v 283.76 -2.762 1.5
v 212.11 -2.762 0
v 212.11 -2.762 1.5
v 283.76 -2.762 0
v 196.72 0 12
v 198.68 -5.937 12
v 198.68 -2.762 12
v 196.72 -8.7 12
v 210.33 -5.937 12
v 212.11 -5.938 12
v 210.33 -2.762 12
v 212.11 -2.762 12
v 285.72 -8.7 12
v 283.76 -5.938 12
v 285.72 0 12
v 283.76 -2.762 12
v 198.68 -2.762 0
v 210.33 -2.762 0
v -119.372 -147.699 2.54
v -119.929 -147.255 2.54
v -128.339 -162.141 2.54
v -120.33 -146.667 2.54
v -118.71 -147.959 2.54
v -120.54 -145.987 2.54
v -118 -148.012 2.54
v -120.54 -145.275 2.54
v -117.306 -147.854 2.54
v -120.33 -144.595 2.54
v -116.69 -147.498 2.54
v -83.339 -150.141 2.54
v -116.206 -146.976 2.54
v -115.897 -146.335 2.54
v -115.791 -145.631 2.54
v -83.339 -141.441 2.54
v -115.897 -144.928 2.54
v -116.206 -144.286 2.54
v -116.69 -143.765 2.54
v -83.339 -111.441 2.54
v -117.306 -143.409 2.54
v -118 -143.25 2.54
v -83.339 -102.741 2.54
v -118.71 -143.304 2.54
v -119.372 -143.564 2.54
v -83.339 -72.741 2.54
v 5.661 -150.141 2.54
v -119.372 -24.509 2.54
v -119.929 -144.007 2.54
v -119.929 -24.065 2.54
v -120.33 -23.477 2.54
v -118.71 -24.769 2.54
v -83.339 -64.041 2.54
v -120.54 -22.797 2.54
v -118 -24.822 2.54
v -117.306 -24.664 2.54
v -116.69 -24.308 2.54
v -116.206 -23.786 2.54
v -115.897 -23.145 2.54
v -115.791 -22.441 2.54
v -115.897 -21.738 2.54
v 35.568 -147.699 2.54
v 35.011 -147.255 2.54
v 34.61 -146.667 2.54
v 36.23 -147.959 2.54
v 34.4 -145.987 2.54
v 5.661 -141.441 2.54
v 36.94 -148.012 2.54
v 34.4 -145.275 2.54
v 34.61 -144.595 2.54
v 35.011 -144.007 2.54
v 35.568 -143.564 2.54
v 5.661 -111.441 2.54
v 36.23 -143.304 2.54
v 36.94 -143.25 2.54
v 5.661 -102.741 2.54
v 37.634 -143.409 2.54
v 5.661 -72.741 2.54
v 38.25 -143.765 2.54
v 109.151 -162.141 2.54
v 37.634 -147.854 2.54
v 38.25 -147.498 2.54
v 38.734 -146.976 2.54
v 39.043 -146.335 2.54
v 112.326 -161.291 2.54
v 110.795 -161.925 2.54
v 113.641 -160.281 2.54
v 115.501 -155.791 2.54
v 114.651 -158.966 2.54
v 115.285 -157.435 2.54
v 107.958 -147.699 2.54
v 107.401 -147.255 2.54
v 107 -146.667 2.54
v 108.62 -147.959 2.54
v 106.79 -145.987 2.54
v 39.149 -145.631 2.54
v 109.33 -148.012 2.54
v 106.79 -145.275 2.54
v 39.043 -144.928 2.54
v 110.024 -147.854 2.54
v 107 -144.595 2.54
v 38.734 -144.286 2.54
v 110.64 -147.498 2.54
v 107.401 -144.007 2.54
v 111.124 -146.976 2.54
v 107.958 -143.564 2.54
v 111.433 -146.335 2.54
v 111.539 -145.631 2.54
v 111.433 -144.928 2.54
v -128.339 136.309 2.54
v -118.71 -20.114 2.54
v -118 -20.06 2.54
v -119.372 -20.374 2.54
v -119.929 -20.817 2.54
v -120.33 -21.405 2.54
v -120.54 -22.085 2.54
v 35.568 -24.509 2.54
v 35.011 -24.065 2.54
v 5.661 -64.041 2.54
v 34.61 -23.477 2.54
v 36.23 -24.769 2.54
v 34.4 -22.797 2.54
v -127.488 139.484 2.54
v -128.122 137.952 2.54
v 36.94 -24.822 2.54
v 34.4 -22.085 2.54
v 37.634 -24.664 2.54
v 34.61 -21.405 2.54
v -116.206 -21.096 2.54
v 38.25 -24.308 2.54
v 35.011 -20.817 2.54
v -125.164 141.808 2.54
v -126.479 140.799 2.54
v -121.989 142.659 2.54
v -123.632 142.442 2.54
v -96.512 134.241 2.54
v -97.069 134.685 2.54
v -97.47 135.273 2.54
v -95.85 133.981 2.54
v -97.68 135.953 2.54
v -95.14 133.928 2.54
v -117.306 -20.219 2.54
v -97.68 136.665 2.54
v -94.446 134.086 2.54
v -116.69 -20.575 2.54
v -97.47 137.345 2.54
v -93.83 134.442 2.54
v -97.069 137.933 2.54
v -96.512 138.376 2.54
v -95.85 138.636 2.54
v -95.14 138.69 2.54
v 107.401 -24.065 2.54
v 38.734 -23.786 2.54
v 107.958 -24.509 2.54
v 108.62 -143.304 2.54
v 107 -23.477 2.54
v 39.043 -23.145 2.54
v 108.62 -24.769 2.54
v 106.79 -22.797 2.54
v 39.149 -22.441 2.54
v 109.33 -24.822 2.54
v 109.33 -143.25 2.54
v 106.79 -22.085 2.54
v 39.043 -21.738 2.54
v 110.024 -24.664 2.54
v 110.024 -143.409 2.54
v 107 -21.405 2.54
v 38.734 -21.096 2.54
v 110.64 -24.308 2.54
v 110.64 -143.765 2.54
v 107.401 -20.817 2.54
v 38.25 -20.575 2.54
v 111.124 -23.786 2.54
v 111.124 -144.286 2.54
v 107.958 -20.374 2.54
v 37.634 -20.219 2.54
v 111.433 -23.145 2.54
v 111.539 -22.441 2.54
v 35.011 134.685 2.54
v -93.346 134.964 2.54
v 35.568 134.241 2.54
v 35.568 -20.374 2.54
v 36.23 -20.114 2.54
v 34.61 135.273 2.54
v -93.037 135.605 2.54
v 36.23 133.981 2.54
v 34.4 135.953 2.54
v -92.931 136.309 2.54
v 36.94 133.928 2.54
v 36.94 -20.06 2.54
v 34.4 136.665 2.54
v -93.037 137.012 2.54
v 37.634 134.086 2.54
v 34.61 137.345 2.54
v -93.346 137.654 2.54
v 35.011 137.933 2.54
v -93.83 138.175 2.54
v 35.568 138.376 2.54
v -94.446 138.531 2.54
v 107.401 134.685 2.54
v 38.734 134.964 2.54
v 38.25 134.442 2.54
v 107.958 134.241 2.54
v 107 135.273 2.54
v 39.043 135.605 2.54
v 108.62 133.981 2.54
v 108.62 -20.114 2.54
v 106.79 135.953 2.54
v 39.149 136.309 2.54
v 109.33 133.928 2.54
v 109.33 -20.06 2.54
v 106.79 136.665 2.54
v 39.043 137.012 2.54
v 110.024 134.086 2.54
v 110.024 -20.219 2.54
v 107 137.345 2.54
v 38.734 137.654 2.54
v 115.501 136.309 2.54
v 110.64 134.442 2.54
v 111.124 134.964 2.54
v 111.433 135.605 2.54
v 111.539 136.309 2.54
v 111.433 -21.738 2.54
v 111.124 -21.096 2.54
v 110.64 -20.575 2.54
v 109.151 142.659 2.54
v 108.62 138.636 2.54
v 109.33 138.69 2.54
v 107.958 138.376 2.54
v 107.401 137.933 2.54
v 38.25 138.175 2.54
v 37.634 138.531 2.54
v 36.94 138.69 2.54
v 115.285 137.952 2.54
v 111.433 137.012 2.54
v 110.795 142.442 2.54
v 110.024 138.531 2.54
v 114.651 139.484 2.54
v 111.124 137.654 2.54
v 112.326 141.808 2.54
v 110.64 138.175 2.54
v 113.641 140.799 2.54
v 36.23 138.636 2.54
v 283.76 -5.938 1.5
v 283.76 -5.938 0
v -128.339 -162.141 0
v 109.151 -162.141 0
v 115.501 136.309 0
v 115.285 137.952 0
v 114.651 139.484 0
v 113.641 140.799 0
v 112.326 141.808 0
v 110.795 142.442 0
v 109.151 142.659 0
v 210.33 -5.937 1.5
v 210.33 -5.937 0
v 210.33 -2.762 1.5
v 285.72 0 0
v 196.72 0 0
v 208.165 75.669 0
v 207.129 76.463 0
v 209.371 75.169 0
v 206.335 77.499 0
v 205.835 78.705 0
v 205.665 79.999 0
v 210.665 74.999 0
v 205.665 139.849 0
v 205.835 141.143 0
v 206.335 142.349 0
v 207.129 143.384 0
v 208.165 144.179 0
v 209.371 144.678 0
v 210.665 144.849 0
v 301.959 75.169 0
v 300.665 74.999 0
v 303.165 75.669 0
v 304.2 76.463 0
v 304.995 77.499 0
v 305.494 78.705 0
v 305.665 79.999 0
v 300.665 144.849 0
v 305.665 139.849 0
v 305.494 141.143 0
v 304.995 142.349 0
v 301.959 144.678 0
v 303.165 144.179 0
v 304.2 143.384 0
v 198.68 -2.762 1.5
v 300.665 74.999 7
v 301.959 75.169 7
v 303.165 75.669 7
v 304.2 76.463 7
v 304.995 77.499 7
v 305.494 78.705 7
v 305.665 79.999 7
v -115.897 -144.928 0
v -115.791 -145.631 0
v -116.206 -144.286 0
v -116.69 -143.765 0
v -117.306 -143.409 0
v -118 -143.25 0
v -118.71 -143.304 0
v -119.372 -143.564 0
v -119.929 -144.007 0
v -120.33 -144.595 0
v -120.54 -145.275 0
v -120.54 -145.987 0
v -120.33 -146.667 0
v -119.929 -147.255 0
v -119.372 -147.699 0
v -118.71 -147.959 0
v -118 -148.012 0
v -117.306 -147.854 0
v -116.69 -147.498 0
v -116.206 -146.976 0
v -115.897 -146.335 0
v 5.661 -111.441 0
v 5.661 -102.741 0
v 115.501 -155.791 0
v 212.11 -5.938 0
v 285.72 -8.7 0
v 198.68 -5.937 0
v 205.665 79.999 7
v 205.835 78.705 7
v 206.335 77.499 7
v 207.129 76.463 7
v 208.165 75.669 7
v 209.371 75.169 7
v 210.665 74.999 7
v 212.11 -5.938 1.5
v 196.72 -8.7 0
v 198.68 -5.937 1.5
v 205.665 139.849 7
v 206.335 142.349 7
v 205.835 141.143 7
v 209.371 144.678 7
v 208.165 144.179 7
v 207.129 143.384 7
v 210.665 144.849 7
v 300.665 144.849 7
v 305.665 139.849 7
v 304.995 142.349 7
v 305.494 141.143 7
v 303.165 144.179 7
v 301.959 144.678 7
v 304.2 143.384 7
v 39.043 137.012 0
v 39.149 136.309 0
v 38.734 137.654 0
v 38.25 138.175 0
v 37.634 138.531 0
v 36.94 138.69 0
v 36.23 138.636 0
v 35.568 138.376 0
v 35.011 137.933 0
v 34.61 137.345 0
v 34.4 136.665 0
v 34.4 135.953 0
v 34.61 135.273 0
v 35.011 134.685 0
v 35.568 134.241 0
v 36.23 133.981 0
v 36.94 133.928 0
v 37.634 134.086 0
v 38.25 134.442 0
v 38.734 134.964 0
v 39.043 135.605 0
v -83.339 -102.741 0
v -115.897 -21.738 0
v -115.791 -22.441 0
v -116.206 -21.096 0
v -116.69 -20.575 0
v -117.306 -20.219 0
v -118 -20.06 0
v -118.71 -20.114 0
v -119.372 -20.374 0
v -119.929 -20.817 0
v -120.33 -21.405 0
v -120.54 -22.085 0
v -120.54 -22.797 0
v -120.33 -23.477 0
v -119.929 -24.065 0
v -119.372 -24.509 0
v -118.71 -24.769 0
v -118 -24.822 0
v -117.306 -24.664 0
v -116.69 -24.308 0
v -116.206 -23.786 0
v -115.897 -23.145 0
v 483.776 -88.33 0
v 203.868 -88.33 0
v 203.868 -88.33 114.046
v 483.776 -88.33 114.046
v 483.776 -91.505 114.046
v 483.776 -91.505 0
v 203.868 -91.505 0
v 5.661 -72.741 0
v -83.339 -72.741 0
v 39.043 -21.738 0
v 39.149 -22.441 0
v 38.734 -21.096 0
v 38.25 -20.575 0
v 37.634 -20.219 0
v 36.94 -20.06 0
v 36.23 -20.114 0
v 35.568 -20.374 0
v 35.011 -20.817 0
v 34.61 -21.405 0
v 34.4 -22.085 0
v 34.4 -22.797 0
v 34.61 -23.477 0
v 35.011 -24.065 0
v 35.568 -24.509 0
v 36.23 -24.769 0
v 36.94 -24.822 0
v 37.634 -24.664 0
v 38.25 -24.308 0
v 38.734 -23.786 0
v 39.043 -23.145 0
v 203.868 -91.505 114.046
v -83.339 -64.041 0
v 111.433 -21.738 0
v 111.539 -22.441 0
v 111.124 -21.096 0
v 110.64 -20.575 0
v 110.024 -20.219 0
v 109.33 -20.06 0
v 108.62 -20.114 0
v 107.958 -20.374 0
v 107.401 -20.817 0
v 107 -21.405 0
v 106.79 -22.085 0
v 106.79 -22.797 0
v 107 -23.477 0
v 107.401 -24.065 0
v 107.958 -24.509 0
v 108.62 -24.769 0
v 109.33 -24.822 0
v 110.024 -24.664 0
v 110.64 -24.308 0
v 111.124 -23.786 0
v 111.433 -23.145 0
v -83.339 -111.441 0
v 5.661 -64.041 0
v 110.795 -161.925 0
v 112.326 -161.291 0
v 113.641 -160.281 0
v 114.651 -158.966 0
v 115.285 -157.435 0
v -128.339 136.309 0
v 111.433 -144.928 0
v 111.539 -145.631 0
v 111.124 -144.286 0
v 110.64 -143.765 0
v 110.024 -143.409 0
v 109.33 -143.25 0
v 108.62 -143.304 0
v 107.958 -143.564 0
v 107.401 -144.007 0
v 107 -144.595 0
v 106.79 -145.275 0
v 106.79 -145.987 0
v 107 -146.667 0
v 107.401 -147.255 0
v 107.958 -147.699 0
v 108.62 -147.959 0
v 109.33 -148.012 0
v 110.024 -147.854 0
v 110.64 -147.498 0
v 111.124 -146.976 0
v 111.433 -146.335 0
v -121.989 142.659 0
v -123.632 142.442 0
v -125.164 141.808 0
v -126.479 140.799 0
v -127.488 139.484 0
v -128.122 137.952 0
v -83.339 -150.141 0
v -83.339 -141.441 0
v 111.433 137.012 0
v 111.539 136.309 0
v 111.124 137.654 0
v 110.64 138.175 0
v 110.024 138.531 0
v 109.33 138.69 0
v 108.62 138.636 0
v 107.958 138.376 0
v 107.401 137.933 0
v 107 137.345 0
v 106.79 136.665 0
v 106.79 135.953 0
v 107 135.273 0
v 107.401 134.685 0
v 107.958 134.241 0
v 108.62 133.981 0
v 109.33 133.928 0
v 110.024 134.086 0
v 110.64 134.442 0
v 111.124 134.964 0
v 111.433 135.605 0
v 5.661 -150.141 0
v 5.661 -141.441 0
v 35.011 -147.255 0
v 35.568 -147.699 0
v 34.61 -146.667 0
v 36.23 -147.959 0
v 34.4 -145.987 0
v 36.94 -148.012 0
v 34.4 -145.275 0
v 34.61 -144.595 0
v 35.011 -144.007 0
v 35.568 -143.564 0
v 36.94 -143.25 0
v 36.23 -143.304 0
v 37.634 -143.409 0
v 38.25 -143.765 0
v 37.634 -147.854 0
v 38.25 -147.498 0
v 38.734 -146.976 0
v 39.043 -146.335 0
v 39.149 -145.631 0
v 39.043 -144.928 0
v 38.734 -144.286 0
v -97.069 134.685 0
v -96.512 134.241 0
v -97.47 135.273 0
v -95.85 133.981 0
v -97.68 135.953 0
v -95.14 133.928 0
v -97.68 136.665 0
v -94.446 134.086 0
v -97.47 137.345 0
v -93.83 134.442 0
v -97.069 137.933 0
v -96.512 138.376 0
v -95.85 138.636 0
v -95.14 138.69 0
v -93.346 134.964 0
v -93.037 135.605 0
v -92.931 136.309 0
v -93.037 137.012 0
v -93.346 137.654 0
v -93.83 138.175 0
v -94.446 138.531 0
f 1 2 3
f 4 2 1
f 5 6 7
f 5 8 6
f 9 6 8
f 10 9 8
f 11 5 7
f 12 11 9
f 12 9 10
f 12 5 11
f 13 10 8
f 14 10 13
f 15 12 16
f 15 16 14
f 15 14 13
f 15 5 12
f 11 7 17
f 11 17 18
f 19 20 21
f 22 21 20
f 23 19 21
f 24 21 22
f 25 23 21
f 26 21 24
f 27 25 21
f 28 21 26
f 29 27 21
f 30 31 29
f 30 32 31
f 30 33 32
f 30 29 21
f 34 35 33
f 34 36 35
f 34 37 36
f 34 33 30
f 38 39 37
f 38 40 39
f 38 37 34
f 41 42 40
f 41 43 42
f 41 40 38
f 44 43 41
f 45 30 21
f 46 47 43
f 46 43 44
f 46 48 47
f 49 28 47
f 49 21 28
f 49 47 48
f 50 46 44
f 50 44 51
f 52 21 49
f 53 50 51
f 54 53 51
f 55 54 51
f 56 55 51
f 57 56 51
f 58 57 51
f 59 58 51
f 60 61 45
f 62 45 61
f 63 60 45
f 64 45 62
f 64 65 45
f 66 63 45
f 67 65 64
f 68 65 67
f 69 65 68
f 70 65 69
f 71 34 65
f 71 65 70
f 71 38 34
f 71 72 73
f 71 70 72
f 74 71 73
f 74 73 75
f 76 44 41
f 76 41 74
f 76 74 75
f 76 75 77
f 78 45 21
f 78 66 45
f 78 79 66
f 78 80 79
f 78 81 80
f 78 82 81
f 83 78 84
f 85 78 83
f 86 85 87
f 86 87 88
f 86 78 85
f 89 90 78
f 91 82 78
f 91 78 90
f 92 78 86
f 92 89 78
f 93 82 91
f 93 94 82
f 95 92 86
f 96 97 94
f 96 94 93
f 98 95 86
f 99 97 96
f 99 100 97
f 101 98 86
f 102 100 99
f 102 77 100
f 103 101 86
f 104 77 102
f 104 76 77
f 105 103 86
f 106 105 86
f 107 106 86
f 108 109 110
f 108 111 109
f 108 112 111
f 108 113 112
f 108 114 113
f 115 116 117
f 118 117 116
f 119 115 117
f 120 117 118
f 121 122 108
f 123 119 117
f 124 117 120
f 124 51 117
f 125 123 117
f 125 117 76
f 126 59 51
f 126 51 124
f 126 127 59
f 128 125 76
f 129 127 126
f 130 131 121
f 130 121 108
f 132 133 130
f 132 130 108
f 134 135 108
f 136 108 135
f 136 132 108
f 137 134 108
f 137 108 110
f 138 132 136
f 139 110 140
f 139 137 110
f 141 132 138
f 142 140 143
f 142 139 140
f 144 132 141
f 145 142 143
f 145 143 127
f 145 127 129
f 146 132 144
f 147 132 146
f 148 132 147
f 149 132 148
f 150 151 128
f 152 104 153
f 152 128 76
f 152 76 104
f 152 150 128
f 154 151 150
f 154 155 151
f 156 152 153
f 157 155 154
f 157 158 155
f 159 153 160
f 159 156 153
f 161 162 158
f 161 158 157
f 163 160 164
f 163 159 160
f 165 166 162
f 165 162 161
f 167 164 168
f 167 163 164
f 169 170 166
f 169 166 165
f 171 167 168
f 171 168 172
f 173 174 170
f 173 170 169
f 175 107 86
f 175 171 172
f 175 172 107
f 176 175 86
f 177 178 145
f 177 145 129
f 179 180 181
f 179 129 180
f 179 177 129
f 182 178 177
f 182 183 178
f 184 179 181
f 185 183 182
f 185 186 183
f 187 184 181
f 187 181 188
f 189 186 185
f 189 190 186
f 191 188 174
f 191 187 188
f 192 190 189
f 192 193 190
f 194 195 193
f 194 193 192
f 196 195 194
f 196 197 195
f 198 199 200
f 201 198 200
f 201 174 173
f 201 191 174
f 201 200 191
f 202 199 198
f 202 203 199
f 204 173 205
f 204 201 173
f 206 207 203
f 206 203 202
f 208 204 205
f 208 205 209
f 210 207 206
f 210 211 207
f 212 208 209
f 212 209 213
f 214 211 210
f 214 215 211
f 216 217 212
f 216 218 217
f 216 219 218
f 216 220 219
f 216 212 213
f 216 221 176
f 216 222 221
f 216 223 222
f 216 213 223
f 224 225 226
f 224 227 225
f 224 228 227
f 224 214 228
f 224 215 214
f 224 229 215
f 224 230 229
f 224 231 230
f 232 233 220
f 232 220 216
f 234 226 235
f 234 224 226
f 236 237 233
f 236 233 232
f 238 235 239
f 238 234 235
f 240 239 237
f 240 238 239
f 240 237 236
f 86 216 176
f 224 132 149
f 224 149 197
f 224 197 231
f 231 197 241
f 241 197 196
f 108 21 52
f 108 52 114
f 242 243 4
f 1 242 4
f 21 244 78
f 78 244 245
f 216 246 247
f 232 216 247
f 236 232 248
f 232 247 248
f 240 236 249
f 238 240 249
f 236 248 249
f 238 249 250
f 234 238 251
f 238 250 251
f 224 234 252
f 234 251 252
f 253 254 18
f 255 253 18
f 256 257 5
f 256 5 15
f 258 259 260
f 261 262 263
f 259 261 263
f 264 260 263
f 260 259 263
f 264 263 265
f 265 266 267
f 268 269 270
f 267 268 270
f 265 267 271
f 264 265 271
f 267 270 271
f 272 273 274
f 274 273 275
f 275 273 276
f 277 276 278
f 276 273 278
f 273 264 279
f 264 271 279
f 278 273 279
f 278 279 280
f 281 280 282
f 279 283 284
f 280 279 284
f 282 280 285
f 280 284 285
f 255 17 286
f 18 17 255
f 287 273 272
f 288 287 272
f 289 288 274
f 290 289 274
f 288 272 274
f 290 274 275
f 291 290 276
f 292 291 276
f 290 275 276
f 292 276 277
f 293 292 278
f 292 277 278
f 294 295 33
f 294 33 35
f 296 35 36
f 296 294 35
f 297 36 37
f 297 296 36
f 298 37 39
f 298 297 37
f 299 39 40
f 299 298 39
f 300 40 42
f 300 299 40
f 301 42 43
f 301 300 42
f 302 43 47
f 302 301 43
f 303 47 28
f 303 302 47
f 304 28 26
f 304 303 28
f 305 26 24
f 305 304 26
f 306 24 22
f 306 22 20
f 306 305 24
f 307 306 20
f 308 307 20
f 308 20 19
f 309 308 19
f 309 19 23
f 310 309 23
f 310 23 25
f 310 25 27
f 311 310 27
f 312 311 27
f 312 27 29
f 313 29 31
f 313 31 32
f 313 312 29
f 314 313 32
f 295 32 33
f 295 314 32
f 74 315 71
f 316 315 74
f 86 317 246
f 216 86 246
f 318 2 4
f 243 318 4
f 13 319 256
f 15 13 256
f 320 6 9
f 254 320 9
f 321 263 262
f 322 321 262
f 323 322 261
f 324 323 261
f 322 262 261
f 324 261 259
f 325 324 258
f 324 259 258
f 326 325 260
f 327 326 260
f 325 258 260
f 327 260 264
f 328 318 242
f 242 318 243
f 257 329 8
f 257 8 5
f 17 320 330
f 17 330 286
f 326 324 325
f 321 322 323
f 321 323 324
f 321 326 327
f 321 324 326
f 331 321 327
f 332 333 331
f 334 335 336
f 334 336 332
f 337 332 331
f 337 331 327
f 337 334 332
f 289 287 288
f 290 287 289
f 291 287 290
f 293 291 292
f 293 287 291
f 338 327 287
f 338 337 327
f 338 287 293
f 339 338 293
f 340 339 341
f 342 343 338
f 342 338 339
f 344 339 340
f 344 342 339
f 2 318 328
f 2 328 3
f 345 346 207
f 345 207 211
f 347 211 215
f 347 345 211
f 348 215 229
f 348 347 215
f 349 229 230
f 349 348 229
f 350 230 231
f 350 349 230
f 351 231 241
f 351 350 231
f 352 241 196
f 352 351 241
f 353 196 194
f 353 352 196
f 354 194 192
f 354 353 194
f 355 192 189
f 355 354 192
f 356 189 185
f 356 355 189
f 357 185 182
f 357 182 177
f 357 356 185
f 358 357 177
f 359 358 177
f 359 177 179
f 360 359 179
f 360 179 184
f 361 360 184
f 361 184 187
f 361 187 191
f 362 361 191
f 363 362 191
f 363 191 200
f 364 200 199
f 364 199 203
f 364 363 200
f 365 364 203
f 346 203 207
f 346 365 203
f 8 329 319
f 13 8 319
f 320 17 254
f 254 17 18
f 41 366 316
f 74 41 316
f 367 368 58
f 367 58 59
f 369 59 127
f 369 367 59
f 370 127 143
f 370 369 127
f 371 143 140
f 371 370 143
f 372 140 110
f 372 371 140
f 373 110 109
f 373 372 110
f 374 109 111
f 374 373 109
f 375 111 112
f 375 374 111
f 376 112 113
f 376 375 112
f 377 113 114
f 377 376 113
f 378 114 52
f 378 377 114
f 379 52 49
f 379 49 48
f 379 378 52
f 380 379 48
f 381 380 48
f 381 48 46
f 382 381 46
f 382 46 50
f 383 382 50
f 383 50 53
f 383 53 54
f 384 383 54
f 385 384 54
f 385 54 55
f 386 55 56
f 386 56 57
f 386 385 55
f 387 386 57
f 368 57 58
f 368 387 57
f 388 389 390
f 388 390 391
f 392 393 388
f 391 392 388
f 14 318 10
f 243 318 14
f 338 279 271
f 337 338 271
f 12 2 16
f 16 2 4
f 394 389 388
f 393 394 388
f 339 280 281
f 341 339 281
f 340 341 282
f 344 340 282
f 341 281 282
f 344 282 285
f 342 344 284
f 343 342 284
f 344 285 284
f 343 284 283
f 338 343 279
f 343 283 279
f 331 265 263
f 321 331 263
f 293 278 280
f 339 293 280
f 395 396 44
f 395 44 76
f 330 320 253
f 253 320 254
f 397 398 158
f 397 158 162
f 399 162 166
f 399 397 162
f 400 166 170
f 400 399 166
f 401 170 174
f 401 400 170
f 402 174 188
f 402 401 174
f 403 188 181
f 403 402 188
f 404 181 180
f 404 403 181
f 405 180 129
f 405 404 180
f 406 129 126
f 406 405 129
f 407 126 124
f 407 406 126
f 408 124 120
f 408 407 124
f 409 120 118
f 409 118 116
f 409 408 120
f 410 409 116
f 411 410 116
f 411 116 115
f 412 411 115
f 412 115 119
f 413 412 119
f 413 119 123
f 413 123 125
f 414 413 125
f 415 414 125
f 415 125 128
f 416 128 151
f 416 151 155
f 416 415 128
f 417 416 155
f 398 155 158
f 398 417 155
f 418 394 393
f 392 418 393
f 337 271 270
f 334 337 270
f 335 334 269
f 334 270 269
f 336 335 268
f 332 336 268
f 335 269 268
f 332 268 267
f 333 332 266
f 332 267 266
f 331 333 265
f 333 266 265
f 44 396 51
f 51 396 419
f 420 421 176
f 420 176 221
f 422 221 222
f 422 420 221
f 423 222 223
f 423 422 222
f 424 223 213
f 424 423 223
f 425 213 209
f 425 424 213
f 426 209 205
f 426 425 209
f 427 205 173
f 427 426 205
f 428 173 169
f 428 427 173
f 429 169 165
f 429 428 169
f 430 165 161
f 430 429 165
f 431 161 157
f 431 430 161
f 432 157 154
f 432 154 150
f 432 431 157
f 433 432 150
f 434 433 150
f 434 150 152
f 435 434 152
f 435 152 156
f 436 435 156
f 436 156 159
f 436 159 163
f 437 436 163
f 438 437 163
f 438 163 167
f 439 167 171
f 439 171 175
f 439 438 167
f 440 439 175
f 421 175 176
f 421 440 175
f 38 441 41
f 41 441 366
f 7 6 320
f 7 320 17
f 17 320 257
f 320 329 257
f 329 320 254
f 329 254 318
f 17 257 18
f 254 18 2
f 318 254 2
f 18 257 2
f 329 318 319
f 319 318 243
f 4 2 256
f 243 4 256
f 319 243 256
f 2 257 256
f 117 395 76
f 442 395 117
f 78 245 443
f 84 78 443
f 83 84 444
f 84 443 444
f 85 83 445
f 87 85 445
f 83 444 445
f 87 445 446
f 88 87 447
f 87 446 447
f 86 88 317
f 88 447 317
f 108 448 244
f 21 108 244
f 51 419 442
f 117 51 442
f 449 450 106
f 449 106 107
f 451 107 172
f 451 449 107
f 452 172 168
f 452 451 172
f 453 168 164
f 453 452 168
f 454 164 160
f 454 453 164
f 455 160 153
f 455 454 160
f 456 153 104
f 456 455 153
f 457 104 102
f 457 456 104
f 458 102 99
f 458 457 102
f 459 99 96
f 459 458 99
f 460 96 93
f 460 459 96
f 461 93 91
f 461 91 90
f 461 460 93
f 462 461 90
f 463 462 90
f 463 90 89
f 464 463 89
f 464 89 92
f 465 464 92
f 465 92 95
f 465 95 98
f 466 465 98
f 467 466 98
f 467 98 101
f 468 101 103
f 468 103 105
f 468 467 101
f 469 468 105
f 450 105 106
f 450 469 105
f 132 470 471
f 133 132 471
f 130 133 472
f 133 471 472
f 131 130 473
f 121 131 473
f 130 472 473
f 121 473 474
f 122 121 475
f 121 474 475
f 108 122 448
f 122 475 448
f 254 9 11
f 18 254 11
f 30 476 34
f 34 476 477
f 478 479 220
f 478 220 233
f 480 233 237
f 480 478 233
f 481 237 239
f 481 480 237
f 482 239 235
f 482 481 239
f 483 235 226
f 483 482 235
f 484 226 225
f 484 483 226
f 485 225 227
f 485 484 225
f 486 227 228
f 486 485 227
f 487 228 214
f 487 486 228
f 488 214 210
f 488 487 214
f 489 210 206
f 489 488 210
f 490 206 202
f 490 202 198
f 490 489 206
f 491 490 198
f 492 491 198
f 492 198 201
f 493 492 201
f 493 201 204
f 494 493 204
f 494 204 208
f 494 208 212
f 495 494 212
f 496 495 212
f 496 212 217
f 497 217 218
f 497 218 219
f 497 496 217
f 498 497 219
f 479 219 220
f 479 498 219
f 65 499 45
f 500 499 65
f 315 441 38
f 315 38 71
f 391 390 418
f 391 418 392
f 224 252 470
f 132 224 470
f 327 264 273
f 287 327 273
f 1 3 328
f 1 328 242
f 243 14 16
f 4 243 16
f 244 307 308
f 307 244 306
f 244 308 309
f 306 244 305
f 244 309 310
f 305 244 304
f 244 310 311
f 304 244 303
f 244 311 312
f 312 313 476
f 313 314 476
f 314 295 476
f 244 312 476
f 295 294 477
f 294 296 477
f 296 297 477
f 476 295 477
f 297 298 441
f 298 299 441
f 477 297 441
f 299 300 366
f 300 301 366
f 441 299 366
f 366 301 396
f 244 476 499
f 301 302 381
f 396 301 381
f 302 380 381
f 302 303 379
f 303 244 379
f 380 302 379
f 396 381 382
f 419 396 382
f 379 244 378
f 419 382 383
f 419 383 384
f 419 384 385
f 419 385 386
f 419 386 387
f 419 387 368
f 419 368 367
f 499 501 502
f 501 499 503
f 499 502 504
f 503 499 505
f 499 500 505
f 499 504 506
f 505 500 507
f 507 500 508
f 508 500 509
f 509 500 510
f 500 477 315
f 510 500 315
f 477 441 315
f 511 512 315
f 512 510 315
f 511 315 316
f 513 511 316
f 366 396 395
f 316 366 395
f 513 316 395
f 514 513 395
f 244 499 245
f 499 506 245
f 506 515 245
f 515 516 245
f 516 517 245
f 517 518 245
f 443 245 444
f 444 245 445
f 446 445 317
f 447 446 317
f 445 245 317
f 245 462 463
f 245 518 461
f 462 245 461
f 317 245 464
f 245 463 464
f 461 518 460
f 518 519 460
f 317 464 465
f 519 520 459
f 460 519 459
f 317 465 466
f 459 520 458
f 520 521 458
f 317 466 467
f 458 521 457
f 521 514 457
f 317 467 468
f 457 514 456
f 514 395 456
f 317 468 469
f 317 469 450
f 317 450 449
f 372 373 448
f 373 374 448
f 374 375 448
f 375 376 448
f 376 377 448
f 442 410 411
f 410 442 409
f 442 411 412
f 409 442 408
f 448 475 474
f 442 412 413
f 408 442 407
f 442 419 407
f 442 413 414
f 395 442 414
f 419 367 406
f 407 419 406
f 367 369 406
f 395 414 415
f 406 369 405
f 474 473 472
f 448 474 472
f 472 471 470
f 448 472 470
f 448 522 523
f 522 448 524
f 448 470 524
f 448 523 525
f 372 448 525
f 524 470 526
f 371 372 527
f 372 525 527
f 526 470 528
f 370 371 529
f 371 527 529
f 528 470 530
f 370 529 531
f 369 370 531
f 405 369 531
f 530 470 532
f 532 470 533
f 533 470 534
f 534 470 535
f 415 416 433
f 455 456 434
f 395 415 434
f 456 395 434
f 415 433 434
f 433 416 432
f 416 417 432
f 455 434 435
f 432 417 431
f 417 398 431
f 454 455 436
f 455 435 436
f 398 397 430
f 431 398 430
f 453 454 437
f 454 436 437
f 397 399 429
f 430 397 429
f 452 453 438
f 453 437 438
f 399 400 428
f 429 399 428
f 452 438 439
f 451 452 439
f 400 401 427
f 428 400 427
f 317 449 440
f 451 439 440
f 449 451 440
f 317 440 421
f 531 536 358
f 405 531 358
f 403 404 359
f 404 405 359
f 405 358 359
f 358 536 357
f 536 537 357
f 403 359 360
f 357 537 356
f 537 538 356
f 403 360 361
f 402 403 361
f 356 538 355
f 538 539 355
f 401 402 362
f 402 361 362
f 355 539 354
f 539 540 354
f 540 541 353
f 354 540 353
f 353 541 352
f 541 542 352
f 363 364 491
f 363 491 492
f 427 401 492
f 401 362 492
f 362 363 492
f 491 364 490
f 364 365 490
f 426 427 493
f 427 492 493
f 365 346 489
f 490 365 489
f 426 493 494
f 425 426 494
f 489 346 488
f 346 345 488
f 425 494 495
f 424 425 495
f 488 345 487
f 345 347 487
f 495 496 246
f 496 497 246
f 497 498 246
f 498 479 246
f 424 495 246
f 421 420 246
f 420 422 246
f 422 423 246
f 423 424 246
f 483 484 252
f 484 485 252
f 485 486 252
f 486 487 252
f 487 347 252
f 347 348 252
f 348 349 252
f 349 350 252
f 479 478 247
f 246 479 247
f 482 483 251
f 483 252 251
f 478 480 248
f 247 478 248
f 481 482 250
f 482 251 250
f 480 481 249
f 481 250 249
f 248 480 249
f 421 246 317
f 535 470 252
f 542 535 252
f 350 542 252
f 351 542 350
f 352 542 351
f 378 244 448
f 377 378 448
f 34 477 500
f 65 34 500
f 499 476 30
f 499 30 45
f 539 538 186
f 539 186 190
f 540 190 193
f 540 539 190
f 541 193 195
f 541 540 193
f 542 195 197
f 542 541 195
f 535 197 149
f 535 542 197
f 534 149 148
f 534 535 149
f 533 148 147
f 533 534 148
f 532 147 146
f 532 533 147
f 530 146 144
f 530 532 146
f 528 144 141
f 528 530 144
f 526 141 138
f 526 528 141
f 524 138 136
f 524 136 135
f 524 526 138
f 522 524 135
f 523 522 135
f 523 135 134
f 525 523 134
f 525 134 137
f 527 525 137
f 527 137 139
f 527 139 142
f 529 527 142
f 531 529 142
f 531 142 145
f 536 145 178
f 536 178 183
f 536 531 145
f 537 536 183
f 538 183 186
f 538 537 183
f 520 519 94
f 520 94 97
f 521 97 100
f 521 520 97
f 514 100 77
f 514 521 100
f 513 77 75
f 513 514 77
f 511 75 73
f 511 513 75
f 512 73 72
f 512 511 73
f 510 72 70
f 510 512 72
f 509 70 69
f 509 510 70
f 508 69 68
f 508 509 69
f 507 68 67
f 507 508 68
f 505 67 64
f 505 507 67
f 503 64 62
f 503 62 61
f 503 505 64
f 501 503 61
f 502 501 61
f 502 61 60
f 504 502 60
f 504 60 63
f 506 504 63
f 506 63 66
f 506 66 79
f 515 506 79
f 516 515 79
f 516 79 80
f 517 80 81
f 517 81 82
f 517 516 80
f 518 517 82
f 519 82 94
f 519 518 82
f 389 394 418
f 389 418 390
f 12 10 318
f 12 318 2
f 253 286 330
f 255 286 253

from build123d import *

# Parameters (mm, degrees)
F0_R     = 2.3876
F0_W     = 89
F0_H     = 8.7
F1_DEPTH = 2.54
F2_W     = 11.65
F2_H     = 3.175
F2_W_2   = 71.65
F3_DEPTH = 1.5
F2_W_3   = 89
F2_H_2   = 8.7
F4_DEPTH = 12
F5_DEPTH = 7
F2_W_4   = 279.908
F6_DEPTH = 114.046


with BuildPart() as f1:
    # F0 (on Top) → F1 (new body)
    with BuildSketch(Plane.XY):
        with BuildLine():
            Line((-118.178641, -162.141275), (109.151359, -162.141275))
            ThreePointArc((109.151359, -162.141275), (113.641487, -160.281403), (115.501359, -155.791275))
            Line((115.501359, -155.791275), (115.501359, 136.308725))
            ThreePointArc((115.501359, 136.308725), (113.641487, 140.798853), (109.151359, 142.658725))
            Line((109.151359, 142.658725), (-95.318641, 142.658725))
            Line((-95.318641, 142.658725), (-121.988641, 142.658725))
            ThreePointArc((-121.988641, 142.658725), (-126.478769, 140.798853), (-128.338641, 136.308725))
            Line((-128.338641, 136.308725), (-128.338641, -162.141275))
            Line((-128.338641, -162.141275), (-118.178641, -162.141275))
        make_face()
        with Locations((-118.178641, -145.631275)):
            Circle(F0_R, mode=Mode.SUBTRACT)
        with Locations((-38.838641, -145.791275)):
            Rectangle(F0_W, F0_H, mode=Mode.SUBTRACT)
        with Locations((-38.838641, -107.091275)):
            Rectangle(F0_W, F0_H, mode=Mode.SUBTRACT)
        with Locations((-118.178641, -22.441275)):
            Circle(F0_R, mode=Mode.SUBTRACT)
        with Locations((-38.838641, -68.391275)):
            Rectangle(F0_W, F0_H, mode=Mode.SUBTRACT)
        with Locations((36.761359, -145.631275)):
            Circle(F0_R, mode=Mode.SUBTRACT)
        with Locations((109.151359, -145.631275)):
            Circle(F0_R, mode=Mode.SUBTRACT)
        with Locations((36.761359, -22.441275)):
            Circle(F0_R, mode=Mode.SUBTRACT)
        with Locations((109.151359, -22.441275)):
            Circle(F0_R, mode=Mode.SUBTRACT)
        with Locations((-95.318641, 136.308725)):
            Circle(F0_R, mode=Mode.SUBTRACT)
        with Locations((36.761359, 136.308725)):
            Circle(F0_R, mode=Mode.SUBTRACT)
        with Locations((109.151359, 136.308725)):
            Circle(F0_R, mode=Mode.SUBTRACT)
    extrude(amount=F1_DEPTH)


with BuildPart() as f3:
    # F2 (on Top) → F3 (new body)
    with BuildSketch(Plane.XY):
        with Locations((204.504683, -4.3495)):
            Rectangle(F2_W, F2_H)
        with Locations((247.934683, -4.35)):
            Rectangle(F2_W_2, F2_H)
    extrude(amount=F3_DEPTH)


with BuildPart() as f4:
    # F2 (on Top) → F4 (new body)
    with BuildSketch(Plane.XY):
        with Locations((241.219683, -4.35)):
            Rectangle(F2_W_3, F2_H_2)
        with Locations((204.504683, -4.3495)):
            Rectangle(F2_W, F2_H, mode=Mode.SUBTRACT)
        with Locations((247.934683, -4.35)):
            Rectangle(F2_W_2, F2_H, mode=Mode.SUBTRACT)
    extrude(amount=F4_DEPTH)


with BuildPart() as f5:
    # F2 (on Top) → F5 (new body)
    with BuildSketch(Plane.XY):
        with BuildLine():
            ThreePointArc((205.664635, 79.998632), (207.129101, 76.463098), (210.664635, 74.998632))
            Line((210.664635, 74.998632), (300.664635, 74.998632))
            ThreePointArc((300.664635, 74.998632), (304.200169, 76.463098), (305.664635, 79.998632))
            Line((305.664635, 79.998632), (305.664635, 139.848632))
            ThreePointArc((305.664635, 139.848632), (304.200169, 143.384166), (300.664635, 144.848632))
            Line((300.664635, 144.848632), (210.664635, 144.848632))
            ThreePointArc((210.664635, 144.848632), (207.129101, 143.384166), (205.664635, 139.848632))
            Line((205.664635, 139.848632), (205.664635, 79.998632))
        make_face()
    extrude(amount=F5_DEPTH)


with BuildPart() as f6:
    # F2 (on Top) → F6 (new body)
    with BuildSketch(Plane.XY):
        with Locations((343.822464, -89.917104)):
            Rectangle(F2_W_4, F2_H)
    extrude(amount=F6_DEPTH)


solid = Compound([f1.part, f3.part, f4.part, f5.part, f6.part])
